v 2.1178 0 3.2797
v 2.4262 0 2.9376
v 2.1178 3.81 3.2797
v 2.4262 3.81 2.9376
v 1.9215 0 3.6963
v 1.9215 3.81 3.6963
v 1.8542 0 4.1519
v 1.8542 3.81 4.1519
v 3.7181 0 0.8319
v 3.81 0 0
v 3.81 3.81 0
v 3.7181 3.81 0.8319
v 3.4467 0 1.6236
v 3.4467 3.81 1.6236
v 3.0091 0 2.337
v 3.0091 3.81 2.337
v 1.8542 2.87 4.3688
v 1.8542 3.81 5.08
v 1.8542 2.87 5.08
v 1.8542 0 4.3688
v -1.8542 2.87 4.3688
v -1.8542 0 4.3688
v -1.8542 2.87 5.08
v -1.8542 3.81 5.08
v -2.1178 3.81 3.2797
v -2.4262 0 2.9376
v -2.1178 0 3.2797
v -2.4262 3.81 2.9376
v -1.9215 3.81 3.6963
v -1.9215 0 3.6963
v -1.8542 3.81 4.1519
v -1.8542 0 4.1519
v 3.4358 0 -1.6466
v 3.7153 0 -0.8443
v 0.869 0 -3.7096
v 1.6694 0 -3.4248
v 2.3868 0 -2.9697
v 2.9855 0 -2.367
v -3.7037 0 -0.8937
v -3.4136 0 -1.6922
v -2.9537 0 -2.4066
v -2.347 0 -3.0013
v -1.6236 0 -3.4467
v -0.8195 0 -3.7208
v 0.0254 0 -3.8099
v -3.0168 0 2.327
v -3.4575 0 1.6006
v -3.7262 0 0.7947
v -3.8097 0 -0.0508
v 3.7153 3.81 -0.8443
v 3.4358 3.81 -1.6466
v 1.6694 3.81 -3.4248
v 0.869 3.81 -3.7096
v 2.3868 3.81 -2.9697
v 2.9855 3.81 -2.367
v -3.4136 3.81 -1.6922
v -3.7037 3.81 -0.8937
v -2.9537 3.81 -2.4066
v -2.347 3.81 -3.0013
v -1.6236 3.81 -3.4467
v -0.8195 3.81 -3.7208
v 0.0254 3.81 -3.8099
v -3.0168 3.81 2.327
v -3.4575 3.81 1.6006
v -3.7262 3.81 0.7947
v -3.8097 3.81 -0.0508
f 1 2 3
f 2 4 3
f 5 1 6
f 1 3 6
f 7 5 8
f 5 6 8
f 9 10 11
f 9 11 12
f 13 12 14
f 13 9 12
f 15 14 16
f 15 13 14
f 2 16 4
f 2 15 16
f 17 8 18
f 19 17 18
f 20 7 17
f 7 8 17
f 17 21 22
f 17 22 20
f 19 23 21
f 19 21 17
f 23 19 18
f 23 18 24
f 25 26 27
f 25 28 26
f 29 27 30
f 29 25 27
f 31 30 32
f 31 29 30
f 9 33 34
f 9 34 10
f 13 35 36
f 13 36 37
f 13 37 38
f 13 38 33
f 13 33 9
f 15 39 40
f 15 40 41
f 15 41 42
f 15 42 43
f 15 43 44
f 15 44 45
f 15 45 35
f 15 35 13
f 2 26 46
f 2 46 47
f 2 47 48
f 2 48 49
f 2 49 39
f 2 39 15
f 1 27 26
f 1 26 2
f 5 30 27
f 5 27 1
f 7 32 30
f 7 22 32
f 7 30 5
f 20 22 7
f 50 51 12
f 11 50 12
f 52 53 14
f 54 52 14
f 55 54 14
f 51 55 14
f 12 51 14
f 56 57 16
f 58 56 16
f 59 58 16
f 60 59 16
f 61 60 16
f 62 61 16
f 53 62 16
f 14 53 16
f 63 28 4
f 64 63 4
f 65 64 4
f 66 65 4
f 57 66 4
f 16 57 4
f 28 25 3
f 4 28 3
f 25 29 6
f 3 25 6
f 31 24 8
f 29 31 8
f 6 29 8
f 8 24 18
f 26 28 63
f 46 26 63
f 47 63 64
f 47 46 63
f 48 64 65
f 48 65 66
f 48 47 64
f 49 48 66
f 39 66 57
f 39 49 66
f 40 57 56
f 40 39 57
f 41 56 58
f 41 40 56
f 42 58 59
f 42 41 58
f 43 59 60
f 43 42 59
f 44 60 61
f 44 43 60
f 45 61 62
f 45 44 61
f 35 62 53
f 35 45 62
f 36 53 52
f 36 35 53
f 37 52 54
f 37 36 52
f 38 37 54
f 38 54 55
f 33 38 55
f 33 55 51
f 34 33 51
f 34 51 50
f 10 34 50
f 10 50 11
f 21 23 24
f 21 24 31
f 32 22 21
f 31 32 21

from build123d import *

# Parameters (mm, degrees)
F1_DEPTH = 3.81
F2_R     = 1.5748
F4_W     = 3.7084
F4_H     = 2.870018
F5_DEPTH = 0.7112


with BuildPart() as f1:
    # F0 (on Front) → F1 (new body)
    with BuildSketch(Plane.XZ):
        with BuildLine():
            ThreePointArc((-1.8542, 3.328369), (-1.930233, -3.284859), (3.81, 0))
            ThreePointArc((3.81, 0), (3.284859, 1.930233), (1.8542, 3.328369))
            ThreePointArc((1.8542, 3.328369), (0.957866, 3.687627), (0, 3.81))
            ThreePointArc((0, 3.81), (-0.957866, 3.687627), (-1.8542, 3.328369))
        make_face()
        with BuildLine():
            ThreePointArc((0, 3.81), (0.957866, 3.687627), (1.8542, 3.328369))
            Line((1.8542, 3.328369), (1.8542, 5.08))
            Line((1.8542, 5.08), (0, 5.08))
            Line((0, 5.08), (0, 3.81))
        make_face()
        with BuildLine():
            Line((-1.8542, 5.08), (-1.8542, 3.328369))
            ThreePointArc((-1.8542, 3.328369), (-0.957866, 3.687627), (0, 3.81))
            Line((0, 3.81), (0, 5.08))
            Line((0, 5.08), (-1.8542, 5.08))
        make_face()
    extrude(amount=-F1_DEPTH)

    # F2
    f2_edges = [f1.edges().sort_by_distance(p)[0] for p in [
        (1.8542, 1.905, 3.328369),
        (-1.8542, 1.905, 3.328369),
    ]]
    fillet(f2_edges, radius=F2_R)

    # F4 (on face) → F5 (cut)
    with BuildSketch(Plane.XY.offset(5.08)):
        with Locations((0, 1.435009)):
            Rectangle(F4_W, F4_H)
    extrude(amount=-F5_DEPTH, mode=Mode.SUBTRACT)


solid = f1.part
